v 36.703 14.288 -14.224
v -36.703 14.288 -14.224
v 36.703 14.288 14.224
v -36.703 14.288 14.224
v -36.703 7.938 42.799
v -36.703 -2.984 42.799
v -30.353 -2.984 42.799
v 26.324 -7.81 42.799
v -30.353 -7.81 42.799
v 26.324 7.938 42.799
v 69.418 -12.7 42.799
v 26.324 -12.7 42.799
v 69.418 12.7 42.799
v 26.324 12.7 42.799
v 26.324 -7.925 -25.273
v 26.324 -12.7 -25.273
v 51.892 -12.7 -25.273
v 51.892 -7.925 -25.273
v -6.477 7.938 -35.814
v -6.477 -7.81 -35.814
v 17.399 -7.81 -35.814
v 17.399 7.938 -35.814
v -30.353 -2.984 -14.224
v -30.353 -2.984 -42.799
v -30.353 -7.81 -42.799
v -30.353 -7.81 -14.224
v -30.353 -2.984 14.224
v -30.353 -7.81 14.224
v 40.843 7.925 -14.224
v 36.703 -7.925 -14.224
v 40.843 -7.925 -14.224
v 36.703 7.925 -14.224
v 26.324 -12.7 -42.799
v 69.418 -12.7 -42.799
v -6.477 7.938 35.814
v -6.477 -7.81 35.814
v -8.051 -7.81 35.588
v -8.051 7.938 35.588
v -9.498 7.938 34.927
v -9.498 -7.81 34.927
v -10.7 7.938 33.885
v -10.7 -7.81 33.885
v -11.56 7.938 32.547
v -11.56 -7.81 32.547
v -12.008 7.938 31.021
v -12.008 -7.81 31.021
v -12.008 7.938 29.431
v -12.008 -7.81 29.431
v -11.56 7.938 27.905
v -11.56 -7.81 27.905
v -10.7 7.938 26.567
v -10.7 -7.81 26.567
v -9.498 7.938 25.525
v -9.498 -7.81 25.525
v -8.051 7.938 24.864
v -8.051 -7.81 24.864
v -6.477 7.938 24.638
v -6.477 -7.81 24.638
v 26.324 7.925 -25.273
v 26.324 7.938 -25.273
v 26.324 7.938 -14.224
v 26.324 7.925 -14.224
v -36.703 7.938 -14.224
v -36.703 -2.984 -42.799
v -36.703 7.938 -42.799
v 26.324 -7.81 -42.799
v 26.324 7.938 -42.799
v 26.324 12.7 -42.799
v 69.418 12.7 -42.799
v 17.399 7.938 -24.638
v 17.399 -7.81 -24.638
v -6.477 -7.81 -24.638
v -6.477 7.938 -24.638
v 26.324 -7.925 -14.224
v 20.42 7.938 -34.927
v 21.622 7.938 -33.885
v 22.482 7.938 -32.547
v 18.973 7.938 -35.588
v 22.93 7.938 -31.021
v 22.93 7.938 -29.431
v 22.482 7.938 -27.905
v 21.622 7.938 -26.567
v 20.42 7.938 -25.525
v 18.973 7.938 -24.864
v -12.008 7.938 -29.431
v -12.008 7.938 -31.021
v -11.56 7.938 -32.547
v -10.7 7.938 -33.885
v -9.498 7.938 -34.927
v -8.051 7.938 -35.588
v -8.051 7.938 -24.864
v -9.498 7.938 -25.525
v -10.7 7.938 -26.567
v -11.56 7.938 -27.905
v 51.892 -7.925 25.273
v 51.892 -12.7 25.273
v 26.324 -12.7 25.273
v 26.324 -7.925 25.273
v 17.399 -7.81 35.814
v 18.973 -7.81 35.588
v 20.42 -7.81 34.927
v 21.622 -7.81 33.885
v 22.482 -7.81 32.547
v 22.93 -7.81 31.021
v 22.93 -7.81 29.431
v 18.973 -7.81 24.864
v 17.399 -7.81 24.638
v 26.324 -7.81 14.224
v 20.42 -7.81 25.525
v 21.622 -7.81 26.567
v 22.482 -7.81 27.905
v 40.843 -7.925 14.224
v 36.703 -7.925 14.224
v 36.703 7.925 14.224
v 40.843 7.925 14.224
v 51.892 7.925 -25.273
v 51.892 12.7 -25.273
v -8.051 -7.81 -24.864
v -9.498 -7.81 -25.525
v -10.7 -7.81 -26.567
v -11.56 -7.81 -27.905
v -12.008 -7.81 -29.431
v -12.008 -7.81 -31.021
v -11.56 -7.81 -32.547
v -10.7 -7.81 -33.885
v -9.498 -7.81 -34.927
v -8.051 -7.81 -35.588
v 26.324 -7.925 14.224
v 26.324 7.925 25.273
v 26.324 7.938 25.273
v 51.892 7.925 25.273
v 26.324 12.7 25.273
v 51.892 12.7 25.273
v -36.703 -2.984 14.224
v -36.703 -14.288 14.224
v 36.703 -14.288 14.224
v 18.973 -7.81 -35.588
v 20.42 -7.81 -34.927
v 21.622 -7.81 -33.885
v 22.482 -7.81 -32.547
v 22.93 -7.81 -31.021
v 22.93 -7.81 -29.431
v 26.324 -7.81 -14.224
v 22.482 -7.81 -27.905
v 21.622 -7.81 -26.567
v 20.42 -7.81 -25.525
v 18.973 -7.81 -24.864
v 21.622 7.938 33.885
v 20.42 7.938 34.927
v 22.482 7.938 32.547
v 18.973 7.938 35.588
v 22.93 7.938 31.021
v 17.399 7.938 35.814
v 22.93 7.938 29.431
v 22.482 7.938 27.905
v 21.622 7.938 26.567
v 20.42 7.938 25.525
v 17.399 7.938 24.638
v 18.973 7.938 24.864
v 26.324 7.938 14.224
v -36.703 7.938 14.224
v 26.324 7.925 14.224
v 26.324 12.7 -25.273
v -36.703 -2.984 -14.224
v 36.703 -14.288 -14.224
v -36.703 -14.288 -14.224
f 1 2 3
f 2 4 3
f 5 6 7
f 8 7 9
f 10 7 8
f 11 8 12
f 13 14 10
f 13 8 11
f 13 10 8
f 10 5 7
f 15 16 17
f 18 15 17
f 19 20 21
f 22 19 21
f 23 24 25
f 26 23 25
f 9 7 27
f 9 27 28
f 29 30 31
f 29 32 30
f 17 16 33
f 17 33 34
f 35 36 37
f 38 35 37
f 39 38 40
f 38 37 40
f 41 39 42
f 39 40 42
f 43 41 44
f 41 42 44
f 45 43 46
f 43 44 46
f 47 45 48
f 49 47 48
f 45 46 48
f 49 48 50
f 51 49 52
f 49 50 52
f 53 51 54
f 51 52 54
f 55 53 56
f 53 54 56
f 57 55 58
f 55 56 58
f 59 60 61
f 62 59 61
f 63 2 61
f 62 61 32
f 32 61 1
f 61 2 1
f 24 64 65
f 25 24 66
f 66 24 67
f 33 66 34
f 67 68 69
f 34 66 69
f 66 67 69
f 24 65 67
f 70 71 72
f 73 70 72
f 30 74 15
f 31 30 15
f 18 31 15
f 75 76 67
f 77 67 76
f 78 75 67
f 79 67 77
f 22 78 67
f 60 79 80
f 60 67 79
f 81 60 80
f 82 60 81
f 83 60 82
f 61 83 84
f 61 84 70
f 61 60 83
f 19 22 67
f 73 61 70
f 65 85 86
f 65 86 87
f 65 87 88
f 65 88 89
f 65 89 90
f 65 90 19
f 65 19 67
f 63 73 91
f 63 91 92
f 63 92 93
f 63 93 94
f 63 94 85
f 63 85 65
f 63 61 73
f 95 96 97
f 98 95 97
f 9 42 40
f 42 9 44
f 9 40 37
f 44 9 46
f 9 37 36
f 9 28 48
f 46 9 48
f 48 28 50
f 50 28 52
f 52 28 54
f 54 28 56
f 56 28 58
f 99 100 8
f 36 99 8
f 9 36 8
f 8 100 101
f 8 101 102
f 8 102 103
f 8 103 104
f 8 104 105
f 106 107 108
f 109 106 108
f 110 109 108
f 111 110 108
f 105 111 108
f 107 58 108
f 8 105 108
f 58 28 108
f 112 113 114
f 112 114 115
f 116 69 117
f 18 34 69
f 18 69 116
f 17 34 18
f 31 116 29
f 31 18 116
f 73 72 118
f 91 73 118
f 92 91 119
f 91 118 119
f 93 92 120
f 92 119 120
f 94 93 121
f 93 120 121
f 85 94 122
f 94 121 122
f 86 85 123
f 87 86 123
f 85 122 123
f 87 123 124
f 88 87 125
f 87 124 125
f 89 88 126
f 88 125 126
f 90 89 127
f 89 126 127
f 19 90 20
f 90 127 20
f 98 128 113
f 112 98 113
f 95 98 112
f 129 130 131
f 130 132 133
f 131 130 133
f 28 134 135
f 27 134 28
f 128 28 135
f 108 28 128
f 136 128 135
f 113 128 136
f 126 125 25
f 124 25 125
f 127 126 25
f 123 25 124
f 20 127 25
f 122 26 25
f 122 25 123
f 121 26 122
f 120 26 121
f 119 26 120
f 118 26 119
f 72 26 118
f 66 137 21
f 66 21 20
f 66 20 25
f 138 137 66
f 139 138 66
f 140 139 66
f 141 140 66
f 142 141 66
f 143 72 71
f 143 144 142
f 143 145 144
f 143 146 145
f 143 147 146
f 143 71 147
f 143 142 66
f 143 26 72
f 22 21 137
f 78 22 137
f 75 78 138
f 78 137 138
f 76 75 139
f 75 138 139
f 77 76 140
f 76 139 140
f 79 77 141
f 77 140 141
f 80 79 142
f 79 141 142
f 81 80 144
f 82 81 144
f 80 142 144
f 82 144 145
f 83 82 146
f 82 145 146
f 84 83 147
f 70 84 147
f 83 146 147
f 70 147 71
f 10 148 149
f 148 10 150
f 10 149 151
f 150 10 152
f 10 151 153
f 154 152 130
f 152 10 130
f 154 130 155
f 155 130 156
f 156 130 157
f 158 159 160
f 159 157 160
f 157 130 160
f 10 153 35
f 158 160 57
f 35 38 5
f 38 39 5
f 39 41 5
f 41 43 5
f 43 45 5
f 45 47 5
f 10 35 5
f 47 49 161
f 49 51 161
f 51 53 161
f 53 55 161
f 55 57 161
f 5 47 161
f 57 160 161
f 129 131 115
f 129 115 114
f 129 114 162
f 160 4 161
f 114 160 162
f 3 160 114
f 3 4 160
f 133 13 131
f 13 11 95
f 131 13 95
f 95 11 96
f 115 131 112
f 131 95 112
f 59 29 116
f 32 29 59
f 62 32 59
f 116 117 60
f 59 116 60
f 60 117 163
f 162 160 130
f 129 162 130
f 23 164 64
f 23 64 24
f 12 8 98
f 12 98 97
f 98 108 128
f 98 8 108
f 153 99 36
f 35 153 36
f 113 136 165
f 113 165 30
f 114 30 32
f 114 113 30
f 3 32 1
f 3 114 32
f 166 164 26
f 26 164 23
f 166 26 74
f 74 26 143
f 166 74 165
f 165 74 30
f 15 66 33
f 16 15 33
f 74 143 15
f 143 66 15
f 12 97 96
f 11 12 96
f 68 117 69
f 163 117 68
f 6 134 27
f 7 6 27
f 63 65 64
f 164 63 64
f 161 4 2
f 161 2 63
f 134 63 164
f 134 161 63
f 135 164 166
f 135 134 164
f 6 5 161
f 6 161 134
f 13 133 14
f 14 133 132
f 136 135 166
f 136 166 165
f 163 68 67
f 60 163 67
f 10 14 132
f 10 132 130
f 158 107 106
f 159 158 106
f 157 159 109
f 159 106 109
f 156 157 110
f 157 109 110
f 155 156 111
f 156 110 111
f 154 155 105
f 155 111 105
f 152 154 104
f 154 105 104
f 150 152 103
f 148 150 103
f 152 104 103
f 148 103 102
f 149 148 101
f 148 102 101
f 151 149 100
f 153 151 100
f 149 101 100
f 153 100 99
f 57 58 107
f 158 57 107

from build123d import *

# Parameters (mm, degrees)
F0_W      = 73.406
F0_H      = 28.575
F1_DEPTH  = 14.224
F3_DEPTH  = 28.575
F5_DEPTH  = 127
F9_DEPTH  = 4.7752
F11_DEPTH = 4.7752
F13_DEPTH = 4.7752
F15_DEPTH = 25.4


with BuildPart() as f1:
    # F0 (on Top) → F1 (new body, symmetric)
    with BuildSketch(Plane.XY):
        Rectangle(F0_W, F0_H)
    extrude(amount=F1_DEPTH, both=True)

    # F2 (on face) → F3 (join)
    with BuildSketch(Plane.XY.offset(14.224)):
        Polygon((26.32423571, 7.9375), (-36.703, 7.9375), (-36.703, -2.9845), (-30.353, -2.9845), (-30.353, -7.8105), (26.32423571, -7.8105), (26.32423571, -12.7), (36.703, -12.7), (36.703, 12.7), (26.32423571, 12.7), align=None)
        Polygon((69.4182, 12.7), (36.703, 12.7), (36.703, -12.7), (69.4182, -12.7), (69.4182, 0), align=None)
    extrude(amount=F3_DEPTH)

    # F4 (on face) → F5 (cut)
    with BuildSketch(Plane.XZ.offset(12.7)):
        Polygon((69.4182, 14.224), (69.4182, 42.799), (40.8432, 14.224), align=None)
    extrude(amount=-F5_DEPTH, mode=Mode.SUBTRACT)

    # F6: F1 across plane


with BuildPart() as f1_1:
    add(f1.part)
    add(f1.part.mirror(Plane.XY))

    # F7 (on face) + F8 (on face) → F9 (cut)
    with BuildSketch(Plane.XZ.offset(12.7)):
        Polygon((51.8922, 25.273), (32.893, 25.273), (26.32423571, 25.273), (26.32423571, 14.224), (36.703, 14.224), (40.8432, 14.224), align=None)
    with BuildSketch(Plane.XZ.offset(12.7)):
        Polygon((26.32423571, -14.224), (26.32423571, -25.273), (51.8922, -25.273), (40.8432, -14.224), (36.703, -14.224), align=None)
    extrude(amount=-F9_DEPTH, mode=Mode.SUBTRACT)

    # F10 (on face) → F11 (cut)
    with BuildSketch(Plane(origin=(0, 12.7, 0), x_dir=(-1, 0, 0), z_dir=(0, 1, 0))):
        Polygon((-40.8432, -14.224), (-51.8922, -25.273), (-26.32423571, -25.273), (-26.32423571, -14.224), (-36.703, -14.224), align=None)
    extrude(amount=-F11_DEPTH, mode=Mode.SUBTRACT)

    # F12 (on face) → F13 (cut)
    with BuildSketch(Plane(origin=(0, 12.7, 0), x_dir=(-1, 0, 0), z_dir=(0, 1, 0))):
        Polygon((-26.32423571, 25.273), (-51.8922, 25.273), (-40.8432, 14.224), (-36.703, 14.224), (-26.32423571, 14.224), align=None)
    extrude(amount=-F13_DEPTH, mode=Mode.SUBTRACT)

    # F14 (on face) → F15 (cut)
    with BuildSketch(Plane.XZ.offset(7.8105)):
        with BuildLine():
            Line((17.399, 35.814), (-6.477, 35.814))
            ThreePointArc((-6.477, 35.814), (-12.065, 30.226), (-6.477, 24.638))
            Line((-6.477, 24.638), (17.399, 24.638))
            ThreePointArc((17.399, 24.638), (22.987, 30.226), (17.399, 35.814))
        make_face()
        with BuildLine():
            Line((17.399, -24.638), (-6.477, -24.638))
            ThreePointArc((-6.477, -24.638), (-12.065, -30.226), (-6.477, -35.814))
            Line((-6.477, -35.814), (17.399, -35.814))
            ThreePointArc((17.399, -35.814), (22.987, -30.226), (17.399, -24.638))
        make_face()
    extrude(amount=-F15_DEPTH, mode=Mode.SUBTRACT)


solid = f1_1.part
